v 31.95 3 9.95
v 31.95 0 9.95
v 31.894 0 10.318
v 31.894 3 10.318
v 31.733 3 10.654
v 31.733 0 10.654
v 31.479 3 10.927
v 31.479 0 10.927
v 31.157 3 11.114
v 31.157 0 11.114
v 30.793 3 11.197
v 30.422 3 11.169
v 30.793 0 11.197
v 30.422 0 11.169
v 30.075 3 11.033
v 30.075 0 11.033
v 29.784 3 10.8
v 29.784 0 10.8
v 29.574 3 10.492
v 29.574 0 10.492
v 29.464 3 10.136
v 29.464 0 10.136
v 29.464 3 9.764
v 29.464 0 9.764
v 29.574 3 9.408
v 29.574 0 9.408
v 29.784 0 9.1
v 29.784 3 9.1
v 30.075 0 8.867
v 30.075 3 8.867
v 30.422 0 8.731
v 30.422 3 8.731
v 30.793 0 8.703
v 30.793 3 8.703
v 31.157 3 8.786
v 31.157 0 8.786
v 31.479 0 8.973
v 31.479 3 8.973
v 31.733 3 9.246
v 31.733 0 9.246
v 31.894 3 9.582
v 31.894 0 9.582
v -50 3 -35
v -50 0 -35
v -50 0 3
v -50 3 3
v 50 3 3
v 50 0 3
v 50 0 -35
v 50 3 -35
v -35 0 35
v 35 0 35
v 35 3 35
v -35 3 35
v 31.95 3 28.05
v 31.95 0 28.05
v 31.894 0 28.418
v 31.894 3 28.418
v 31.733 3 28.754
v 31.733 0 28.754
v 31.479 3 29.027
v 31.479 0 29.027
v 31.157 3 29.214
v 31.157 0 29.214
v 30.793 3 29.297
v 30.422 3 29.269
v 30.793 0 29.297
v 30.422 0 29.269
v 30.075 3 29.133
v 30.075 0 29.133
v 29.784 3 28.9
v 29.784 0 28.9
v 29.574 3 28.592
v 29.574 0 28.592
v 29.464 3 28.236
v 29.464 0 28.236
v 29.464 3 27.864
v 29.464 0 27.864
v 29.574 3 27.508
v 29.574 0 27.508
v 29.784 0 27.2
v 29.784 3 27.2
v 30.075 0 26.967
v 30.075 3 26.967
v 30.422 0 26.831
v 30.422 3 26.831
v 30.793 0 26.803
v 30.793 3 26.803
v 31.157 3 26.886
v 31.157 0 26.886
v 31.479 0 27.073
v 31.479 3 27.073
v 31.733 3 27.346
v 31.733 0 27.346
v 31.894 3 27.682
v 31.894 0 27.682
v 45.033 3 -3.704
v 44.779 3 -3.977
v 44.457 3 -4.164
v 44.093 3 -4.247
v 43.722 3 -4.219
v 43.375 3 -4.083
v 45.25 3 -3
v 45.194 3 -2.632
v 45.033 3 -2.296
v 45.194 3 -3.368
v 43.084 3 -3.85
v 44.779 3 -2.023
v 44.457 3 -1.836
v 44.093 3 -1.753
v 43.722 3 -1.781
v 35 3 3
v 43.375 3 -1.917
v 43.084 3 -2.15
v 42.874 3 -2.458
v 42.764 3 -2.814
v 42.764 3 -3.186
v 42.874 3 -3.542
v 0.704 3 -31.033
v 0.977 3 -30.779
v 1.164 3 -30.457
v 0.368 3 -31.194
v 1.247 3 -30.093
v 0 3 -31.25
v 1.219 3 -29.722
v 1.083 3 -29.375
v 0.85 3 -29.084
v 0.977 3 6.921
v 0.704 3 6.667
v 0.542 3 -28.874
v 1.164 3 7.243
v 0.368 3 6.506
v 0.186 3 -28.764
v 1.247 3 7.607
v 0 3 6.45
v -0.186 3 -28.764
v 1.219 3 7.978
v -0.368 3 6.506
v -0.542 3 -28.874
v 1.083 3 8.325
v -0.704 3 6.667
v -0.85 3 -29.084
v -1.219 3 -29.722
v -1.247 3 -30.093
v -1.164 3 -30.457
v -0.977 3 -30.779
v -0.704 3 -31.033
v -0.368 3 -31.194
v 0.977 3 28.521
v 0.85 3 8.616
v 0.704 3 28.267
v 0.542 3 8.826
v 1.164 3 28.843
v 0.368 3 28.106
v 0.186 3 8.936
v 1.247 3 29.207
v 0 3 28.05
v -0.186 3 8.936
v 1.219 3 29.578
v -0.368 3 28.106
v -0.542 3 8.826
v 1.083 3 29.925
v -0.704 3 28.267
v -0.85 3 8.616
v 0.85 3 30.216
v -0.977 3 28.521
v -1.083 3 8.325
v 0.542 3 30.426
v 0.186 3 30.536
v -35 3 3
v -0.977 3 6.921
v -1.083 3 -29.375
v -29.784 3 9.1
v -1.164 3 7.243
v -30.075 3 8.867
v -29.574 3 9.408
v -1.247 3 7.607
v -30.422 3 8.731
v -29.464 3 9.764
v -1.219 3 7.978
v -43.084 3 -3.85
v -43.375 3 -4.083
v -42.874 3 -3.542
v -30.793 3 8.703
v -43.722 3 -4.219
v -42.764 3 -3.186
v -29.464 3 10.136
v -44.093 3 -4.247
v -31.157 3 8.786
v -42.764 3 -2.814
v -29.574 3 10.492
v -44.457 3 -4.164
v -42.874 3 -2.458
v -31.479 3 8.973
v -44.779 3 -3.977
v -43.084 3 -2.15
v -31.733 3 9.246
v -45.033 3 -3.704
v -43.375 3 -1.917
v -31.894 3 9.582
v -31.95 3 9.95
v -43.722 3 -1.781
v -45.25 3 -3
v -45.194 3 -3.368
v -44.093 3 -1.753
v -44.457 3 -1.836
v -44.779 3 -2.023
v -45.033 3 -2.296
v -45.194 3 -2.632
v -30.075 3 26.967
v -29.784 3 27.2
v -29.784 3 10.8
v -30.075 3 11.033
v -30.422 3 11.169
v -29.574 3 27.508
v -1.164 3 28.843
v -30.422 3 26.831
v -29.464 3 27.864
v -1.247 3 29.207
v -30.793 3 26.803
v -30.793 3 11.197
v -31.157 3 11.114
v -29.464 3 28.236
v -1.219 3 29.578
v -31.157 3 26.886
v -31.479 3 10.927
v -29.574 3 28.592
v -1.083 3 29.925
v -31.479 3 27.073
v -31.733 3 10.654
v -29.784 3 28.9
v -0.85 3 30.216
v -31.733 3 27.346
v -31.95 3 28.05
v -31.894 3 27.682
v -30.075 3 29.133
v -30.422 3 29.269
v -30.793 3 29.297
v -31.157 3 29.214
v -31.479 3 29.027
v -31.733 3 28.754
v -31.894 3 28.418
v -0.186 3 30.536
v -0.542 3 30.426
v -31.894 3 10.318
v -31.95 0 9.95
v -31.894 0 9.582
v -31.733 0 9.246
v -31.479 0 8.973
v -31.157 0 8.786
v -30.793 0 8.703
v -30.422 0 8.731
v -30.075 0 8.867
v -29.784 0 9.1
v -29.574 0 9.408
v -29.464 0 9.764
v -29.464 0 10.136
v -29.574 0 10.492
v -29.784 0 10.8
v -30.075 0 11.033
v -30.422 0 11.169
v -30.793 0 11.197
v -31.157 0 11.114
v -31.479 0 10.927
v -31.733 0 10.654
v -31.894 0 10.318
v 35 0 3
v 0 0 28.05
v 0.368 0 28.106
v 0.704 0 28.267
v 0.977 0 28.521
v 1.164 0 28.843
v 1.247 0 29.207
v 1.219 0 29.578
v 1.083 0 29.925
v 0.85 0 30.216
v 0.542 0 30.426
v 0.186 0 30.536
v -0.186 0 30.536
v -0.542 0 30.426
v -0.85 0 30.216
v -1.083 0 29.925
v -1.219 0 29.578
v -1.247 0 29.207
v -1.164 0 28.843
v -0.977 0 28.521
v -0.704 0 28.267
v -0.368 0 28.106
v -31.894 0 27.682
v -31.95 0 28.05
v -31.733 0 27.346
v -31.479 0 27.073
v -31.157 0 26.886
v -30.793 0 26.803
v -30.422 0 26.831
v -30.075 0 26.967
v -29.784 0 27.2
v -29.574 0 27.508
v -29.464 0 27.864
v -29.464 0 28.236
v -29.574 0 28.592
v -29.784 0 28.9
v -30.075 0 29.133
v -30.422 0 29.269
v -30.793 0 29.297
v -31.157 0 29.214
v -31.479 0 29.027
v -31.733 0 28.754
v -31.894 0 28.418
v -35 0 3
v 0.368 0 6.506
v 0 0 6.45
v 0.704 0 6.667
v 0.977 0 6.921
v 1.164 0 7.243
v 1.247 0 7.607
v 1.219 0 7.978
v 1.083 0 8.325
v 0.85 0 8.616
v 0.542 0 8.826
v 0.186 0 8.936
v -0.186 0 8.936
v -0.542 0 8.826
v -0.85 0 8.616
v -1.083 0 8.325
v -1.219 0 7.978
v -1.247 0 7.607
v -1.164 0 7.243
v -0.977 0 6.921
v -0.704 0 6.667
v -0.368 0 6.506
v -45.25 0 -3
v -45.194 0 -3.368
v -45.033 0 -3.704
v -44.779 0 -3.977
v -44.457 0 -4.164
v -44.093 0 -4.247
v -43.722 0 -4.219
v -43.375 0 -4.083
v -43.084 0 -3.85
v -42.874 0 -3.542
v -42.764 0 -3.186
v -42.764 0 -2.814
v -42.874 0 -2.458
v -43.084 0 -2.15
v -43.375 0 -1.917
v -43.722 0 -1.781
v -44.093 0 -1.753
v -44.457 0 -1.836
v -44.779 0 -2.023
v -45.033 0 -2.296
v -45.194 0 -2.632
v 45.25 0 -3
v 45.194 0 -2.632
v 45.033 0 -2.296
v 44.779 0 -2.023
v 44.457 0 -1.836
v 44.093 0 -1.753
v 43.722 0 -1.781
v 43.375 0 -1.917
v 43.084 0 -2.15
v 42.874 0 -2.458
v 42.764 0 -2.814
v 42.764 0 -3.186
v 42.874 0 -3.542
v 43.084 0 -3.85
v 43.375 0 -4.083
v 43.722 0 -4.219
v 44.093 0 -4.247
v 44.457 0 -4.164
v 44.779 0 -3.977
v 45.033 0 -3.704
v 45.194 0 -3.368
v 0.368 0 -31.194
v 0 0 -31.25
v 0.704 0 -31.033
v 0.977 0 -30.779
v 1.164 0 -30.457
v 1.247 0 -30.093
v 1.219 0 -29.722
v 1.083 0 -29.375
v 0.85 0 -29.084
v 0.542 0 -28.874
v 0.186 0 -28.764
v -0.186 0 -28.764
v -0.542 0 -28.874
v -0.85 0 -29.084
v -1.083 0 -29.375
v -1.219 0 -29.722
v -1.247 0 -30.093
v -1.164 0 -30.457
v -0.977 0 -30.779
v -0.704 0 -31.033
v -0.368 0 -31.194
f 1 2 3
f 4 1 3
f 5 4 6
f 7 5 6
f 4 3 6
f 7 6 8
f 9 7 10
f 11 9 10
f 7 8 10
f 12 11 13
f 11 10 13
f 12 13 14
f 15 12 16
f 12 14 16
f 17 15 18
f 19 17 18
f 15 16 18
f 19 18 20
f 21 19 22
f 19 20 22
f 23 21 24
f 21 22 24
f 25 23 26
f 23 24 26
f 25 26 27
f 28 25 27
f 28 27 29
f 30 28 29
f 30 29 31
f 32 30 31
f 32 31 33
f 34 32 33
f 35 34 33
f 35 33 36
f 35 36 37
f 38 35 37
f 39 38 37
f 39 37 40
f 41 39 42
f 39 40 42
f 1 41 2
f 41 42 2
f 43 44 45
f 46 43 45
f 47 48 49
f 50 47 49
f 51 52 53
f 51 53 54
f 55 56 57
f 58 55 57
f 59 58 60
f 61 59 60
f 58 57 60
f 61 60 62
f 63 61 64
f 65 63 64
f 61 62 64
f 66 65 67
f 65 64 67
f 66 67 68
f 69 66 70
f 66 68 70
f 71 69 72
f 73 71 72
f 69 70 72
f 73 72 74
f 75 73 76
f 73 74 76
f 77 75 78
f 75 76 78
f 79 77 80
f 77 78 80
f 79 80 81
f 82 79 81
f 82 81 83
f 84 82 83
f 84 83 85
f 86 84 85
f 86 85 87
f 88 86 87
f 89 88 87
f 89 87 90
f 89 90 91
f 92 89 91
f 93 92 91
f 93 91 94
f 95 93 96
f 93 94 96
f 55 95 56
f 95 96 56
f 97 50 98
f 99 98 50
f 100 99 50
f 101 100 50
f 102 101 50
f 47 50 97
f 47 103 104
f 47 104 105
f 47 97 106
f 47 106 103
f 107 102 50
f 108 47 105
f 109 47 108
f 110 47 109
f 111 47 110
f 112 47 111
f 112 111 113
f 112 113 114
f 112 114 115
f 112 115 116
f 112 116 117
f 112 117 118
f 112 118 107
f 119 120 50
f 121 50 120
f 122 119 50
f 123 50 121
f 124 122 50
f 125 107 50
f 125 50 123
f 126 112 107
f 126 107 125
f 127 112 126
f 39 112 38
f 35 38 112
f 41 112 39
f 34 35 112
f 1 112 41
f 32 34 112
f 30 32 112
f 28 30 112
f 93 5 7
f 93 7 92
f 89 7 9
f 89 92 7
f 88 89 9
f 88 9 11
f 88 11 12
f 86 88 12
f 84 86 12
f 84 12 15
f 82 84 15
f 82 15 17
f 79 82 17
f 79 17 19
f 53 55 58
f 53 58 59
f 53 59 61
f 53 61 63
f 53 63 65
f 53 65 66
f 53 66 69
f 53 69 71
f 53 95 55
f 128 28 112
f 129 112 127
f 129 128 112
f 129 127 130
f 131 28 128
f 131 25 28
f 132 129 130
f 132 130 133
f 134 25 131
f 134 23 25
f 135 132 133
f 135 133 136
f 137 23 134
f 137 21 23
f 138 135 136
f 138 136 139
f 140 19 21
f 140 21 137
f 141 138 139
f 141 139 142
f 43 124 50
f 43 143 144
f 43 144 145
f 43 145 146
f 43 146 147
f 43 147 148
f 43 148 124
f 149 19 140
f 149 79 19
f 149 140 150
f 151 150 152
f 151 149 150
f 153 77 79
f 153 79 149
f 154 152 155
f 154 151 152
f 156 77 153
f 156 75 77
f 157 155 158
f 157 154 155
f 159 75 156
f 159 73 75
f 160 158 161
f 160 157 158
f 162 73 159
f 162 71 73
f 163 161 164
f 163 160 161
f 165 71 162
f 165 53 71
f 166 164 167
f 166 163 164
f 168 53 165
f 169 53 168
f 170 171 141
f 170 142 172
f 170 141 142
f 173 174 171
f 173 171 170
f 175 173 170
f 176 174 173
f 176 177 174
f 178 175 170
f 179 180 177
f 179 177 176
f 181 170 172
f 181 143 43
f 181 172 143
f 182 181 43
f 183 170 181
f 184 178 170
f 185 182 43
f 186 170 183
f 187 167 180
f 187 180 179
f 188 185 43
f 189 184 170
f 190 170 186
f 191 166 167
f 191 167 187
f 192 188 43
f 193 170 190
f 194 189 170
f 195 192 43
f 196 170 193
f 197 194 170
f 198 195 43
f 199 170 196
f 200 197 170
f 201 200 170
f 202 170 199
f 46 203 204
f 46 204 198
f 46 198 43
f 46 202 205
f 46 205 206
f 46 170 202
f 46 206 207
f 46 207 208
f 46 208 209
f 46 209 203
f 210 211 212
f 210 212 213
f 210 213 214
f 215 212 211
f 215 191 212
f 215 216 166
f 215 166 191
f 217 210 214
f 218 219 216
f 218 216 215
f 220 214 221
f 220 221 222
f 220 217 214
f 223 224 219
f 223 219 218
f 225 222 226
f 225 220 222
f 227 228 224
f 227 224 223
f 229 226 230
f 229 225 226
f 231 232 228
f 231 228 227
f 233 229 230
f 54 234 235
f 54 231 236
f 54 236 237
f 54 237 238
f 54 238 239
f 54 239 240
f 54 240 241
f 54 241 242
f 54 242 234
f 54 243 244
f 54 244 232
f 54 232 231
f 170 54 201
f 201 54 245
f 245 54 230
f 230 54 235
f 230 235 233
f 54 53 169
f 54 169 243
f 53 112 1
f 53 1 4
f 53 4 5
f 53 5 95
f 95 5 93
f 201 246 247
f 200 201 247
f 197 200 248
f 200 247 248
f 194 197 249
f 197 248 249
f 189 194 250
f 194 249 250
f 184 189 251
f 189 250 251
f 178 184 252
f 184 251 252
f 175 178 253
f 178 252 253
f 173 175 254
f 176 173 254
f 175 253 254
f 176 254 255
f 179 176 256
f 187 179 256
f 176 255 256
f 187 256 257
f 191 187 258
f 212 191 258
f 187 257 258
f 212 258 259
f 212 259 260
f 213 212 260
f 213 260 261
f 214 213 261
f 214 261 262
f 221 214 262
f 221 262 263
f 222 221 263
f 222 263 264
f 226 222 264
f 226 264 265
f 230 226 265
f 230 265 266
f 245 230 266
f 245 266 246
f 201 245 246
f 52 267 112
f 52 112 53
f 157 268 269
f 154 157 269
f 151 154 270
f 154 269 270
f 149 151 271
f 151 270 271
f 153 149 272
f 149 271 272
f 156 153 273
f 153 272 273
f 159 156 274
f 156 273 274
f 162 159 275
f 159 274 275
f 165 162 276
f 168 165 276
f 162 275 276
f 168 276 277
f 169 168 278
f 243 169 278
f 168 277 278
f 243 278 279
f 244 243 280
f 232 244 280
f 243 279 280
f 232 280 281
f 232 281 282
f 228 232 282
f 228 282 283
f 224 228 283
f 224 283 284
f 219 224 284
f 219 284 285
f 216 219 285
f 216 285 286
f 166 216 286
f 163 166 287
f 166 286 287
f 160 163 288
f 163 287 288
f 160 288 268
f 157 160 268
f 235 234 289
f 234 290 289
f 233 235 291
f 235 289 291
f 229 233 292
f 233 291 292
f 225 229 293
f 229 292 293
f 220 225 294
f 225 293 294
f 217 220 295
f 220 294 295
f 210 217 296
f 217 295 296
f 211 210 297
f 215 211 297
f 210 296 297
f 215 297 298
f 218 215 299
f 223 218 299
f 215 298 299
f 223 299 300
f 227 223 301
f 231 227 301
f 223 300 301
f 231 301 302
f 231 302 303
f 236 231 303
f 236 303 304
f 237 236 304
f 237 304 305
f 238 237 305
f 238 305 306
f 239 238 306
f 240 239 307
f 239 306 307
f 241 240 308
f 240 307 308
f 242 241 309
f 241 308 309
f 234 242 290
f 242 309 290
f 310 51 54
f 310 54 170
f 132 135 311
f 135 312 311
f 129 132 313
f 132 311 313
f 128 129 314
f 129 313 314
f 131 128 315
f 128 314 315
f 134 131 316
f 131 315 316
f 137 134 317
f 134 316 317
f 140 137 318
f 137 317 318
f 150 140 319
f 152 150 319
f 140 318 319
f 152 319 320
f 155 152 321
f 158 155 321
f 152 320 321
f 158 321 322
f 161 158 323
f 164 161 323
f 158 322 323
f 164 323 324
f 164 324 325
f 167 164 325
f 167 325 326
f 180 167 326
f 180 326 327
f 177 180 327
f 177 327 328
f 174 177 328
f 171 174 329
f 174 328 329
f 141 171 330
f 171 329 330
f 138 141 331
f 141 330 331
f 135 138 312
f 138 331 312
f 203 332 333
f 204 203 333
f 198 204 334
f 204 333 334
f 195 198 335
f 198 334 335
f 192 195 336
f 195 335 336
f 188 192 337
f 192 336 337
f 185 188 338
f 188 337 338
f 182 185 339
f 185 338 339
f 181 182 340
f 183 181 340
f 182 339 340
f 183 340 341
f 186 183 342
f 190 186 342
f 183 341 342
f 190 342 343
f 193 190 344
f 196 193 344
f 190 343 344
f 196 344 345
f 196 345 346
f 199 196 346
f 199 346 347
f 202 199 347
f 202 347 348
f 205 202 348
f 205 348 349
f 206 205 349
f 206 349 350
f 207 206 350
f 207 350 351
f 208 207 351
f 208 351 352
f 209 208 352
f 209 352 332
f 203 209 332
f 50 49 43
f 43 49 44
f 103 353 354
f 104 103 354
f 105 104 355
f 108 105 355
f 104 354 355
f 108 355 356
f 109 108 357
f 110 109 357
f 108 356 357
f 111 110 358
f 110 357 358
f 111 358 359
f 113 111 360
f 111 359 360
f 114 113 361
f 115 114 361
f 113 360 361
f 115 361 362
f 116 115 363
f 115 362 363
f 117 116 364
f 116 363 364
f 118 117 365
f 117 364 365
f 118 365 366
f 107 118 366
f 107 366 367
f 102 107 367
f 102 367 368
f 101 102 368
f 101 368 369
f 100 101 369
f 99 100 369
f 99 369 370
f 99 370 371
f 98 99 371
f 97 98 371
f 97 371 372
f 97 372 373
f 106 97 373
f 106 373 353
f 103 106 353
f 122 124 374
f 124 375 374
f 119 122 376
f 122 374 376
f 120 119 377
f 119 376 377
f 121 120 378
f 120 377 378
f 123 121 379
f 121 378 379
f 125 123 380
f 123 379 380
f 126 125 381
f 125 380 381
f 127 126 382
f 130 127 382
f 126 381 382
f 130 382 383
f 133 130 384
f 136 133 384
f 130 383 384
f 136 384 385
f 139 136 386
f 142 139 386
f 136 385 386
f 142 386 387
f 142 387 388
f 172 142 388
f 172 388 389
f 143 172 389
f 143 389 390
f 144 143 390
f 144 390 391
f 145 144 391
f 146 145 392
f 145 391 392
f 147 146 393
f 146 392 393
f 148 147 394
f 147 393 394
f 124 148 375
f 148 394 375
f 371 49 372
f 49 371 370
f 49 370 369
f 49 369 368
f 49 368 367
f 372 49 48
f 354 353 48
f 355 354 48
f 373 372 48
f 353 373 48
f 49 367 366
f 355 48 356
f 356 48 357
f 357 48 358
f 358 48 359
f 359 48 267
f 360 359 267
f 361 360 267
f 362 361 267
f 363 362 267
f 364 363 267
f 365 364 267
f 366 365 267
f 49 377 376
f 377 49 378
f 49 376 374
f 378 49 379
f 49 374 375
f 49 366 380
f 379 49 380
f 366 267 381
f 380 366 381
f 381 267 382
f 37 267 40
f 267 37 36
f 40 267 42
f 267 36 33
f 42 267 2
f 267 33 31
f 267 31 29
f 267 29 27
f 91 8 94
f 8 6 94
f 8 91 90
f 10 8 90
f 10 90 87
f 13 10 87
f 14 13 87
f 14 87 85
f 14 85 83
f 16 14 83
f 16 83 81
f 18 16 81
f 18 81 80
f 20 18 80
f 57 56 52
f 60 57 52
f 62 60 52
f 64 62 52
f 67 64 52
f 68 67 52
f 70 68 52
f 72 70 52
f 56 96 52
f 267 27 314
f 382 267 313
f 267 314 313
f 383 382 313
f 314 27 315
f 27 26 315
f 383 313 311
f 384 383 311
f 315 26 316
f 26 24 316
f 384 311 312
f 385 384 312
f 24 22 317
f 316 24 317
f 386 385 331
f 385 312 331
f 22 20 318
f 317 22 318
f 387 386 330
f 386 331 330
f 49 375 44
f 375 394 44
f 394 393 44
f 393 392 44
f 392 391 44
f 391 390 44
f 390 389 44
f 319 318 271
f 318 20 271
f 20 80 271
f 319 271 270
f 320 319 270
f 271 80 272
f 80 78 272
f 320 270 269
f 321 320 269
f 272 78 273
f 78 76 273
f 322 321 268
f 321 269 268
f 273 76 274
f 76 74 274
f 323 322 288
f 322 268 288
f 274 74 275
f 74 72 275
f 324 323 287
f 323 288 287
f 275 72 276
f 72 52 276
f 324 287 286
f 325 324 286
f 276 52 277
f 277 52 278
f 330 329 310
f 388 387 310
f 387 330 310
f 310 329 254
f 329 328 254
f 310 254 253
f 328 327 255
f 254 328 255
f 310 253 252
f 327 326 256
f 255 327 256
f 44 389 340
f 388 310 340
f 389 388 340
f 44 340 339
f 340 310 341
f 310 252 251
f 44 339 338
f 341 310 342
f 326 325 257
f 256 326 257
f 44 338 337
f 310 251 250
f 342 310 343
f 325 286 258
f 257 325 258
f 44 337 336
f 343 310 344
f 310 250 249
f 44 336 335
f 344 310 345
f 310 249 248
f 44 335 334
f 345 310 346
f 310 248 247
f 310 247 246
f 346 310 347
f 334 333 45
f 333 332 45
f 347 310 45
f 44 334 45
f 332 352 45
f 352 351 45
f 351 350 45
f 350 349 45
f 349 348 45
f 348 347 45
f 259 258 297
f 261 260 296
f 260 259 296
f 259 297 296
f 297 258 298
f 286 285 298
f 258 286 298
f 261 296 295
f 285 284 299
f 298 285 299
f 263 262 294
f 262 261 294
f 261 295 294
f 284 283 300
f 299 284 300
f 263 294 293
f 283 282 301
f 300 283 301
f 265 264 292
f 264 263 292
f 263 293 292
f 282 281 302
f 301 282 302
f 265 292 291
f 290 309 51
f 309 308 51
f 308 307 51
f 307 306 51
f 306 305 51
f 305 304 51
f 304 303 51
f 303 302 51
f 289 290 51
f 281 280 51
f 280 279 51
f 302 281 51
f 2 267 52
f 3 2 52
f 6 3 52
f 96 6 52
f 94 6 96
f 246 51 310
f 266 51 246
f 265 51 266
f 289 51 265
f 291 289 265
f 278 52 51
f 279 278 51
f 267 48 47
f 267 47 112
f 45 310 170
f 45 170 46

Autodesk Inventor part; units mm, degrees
ref_plane "YZ Plane" through (0, 0, 0) normal (1, 0, 0) x (0, 1, 0)
ref_plane "XZ Plane" through (0, 0, 0) normal (0, 1, 0) x (-1, 0, 0)
ref_plane "XY Plane" through (0, 0, 0) normal (0, 0, 1) x (1, 0, 0)
sketch "Sketch1" plane through (0, 0, 0) normal (0, 1, 0) x (-1, 0, 0)
  line L0 (35, 35) -> (35, 3)
  line L1 (9, 3) -> (35, 3) construction
  line L2 (0, 3) -> (9, 3) construction
  line L3 (35, 3) -> (50, 3)
  line L4 (0, -35) -> (0, 35)
  line L5 (0, -35) -> (50, -35)
  line L6 (0, 35) -> (35, 35)
  line L7 (50, -35) -> (50, 3)
  line L8 (30.7, 28.05) -> (35, 28.05) construction
  line L9 (30.7, 28.05) -> (30.7, 9.95) construction
  line L10 (30.7, 9.95) -> (30.7, 3) construction
  circle A0 centre (30.7, 9.95) radius 1.25
  circle A1 centre (30.7, 28.05) radius 1.25
  line L11 (50, -16) -> (37.1975, -16) construction
  circle A2 centre (44, -3) radius 1.25
  arc A3 (0, -31.25) -> (0, -28.75) centre (0, -30) ccw
  arc A4 (0, 6.45) -> (0, 8.95) centre (0, 7.7) ccw
  arc A5 (0, 28.05) -> (0, 30.55) centre (0, 29.3) ccw
  line L12 (0, 29.3) -> (30.7, 29.3) construction
  point P0 (0, 0)
  point P1 (-50, 0)
  point P2 (0, 0)
  dimension "d26" = 2.5
  dimension "d6" = 32
  dimension "d9" = 26
  dimension "d10" = 9
  dimension "d11" = 50
  dimension "d12" = 70
  dimension "d14" = 4.3
  dimension "d15" = 18.1
  dimension "d20" = 6.95
  dimension "d25" = 2.5
  dimension "d32" = 2.5
  dimension "d33" = 2.5
  dimension "d35" = 2.5
  dimension "d36" = 2.5
  dimension "d37" = 2.25
  dimension "d38" = 6
  dimension "d39" = 5
  dimension "d40" = 6
extrude "Extrusion1" add sketch "Sketch1" along normal blind 3 contours L0 L3 L7 L5 L4 A3 A4 A5 L6 | A5 L4 | A4 L4 | L4 A3 | A0 | A1 | A2
extrude "Extrusion4" cut sketch "Sketch1" along normal through all contours A5 L4 | A4 L4 | L4 A3 | A0 | A1 | A2
mirror "Mirror1" about plane through (0, 0, 0) normal (1, 0, 0) of "Extrusion1", "Extrusion4"
properties part number "Podstawa"
